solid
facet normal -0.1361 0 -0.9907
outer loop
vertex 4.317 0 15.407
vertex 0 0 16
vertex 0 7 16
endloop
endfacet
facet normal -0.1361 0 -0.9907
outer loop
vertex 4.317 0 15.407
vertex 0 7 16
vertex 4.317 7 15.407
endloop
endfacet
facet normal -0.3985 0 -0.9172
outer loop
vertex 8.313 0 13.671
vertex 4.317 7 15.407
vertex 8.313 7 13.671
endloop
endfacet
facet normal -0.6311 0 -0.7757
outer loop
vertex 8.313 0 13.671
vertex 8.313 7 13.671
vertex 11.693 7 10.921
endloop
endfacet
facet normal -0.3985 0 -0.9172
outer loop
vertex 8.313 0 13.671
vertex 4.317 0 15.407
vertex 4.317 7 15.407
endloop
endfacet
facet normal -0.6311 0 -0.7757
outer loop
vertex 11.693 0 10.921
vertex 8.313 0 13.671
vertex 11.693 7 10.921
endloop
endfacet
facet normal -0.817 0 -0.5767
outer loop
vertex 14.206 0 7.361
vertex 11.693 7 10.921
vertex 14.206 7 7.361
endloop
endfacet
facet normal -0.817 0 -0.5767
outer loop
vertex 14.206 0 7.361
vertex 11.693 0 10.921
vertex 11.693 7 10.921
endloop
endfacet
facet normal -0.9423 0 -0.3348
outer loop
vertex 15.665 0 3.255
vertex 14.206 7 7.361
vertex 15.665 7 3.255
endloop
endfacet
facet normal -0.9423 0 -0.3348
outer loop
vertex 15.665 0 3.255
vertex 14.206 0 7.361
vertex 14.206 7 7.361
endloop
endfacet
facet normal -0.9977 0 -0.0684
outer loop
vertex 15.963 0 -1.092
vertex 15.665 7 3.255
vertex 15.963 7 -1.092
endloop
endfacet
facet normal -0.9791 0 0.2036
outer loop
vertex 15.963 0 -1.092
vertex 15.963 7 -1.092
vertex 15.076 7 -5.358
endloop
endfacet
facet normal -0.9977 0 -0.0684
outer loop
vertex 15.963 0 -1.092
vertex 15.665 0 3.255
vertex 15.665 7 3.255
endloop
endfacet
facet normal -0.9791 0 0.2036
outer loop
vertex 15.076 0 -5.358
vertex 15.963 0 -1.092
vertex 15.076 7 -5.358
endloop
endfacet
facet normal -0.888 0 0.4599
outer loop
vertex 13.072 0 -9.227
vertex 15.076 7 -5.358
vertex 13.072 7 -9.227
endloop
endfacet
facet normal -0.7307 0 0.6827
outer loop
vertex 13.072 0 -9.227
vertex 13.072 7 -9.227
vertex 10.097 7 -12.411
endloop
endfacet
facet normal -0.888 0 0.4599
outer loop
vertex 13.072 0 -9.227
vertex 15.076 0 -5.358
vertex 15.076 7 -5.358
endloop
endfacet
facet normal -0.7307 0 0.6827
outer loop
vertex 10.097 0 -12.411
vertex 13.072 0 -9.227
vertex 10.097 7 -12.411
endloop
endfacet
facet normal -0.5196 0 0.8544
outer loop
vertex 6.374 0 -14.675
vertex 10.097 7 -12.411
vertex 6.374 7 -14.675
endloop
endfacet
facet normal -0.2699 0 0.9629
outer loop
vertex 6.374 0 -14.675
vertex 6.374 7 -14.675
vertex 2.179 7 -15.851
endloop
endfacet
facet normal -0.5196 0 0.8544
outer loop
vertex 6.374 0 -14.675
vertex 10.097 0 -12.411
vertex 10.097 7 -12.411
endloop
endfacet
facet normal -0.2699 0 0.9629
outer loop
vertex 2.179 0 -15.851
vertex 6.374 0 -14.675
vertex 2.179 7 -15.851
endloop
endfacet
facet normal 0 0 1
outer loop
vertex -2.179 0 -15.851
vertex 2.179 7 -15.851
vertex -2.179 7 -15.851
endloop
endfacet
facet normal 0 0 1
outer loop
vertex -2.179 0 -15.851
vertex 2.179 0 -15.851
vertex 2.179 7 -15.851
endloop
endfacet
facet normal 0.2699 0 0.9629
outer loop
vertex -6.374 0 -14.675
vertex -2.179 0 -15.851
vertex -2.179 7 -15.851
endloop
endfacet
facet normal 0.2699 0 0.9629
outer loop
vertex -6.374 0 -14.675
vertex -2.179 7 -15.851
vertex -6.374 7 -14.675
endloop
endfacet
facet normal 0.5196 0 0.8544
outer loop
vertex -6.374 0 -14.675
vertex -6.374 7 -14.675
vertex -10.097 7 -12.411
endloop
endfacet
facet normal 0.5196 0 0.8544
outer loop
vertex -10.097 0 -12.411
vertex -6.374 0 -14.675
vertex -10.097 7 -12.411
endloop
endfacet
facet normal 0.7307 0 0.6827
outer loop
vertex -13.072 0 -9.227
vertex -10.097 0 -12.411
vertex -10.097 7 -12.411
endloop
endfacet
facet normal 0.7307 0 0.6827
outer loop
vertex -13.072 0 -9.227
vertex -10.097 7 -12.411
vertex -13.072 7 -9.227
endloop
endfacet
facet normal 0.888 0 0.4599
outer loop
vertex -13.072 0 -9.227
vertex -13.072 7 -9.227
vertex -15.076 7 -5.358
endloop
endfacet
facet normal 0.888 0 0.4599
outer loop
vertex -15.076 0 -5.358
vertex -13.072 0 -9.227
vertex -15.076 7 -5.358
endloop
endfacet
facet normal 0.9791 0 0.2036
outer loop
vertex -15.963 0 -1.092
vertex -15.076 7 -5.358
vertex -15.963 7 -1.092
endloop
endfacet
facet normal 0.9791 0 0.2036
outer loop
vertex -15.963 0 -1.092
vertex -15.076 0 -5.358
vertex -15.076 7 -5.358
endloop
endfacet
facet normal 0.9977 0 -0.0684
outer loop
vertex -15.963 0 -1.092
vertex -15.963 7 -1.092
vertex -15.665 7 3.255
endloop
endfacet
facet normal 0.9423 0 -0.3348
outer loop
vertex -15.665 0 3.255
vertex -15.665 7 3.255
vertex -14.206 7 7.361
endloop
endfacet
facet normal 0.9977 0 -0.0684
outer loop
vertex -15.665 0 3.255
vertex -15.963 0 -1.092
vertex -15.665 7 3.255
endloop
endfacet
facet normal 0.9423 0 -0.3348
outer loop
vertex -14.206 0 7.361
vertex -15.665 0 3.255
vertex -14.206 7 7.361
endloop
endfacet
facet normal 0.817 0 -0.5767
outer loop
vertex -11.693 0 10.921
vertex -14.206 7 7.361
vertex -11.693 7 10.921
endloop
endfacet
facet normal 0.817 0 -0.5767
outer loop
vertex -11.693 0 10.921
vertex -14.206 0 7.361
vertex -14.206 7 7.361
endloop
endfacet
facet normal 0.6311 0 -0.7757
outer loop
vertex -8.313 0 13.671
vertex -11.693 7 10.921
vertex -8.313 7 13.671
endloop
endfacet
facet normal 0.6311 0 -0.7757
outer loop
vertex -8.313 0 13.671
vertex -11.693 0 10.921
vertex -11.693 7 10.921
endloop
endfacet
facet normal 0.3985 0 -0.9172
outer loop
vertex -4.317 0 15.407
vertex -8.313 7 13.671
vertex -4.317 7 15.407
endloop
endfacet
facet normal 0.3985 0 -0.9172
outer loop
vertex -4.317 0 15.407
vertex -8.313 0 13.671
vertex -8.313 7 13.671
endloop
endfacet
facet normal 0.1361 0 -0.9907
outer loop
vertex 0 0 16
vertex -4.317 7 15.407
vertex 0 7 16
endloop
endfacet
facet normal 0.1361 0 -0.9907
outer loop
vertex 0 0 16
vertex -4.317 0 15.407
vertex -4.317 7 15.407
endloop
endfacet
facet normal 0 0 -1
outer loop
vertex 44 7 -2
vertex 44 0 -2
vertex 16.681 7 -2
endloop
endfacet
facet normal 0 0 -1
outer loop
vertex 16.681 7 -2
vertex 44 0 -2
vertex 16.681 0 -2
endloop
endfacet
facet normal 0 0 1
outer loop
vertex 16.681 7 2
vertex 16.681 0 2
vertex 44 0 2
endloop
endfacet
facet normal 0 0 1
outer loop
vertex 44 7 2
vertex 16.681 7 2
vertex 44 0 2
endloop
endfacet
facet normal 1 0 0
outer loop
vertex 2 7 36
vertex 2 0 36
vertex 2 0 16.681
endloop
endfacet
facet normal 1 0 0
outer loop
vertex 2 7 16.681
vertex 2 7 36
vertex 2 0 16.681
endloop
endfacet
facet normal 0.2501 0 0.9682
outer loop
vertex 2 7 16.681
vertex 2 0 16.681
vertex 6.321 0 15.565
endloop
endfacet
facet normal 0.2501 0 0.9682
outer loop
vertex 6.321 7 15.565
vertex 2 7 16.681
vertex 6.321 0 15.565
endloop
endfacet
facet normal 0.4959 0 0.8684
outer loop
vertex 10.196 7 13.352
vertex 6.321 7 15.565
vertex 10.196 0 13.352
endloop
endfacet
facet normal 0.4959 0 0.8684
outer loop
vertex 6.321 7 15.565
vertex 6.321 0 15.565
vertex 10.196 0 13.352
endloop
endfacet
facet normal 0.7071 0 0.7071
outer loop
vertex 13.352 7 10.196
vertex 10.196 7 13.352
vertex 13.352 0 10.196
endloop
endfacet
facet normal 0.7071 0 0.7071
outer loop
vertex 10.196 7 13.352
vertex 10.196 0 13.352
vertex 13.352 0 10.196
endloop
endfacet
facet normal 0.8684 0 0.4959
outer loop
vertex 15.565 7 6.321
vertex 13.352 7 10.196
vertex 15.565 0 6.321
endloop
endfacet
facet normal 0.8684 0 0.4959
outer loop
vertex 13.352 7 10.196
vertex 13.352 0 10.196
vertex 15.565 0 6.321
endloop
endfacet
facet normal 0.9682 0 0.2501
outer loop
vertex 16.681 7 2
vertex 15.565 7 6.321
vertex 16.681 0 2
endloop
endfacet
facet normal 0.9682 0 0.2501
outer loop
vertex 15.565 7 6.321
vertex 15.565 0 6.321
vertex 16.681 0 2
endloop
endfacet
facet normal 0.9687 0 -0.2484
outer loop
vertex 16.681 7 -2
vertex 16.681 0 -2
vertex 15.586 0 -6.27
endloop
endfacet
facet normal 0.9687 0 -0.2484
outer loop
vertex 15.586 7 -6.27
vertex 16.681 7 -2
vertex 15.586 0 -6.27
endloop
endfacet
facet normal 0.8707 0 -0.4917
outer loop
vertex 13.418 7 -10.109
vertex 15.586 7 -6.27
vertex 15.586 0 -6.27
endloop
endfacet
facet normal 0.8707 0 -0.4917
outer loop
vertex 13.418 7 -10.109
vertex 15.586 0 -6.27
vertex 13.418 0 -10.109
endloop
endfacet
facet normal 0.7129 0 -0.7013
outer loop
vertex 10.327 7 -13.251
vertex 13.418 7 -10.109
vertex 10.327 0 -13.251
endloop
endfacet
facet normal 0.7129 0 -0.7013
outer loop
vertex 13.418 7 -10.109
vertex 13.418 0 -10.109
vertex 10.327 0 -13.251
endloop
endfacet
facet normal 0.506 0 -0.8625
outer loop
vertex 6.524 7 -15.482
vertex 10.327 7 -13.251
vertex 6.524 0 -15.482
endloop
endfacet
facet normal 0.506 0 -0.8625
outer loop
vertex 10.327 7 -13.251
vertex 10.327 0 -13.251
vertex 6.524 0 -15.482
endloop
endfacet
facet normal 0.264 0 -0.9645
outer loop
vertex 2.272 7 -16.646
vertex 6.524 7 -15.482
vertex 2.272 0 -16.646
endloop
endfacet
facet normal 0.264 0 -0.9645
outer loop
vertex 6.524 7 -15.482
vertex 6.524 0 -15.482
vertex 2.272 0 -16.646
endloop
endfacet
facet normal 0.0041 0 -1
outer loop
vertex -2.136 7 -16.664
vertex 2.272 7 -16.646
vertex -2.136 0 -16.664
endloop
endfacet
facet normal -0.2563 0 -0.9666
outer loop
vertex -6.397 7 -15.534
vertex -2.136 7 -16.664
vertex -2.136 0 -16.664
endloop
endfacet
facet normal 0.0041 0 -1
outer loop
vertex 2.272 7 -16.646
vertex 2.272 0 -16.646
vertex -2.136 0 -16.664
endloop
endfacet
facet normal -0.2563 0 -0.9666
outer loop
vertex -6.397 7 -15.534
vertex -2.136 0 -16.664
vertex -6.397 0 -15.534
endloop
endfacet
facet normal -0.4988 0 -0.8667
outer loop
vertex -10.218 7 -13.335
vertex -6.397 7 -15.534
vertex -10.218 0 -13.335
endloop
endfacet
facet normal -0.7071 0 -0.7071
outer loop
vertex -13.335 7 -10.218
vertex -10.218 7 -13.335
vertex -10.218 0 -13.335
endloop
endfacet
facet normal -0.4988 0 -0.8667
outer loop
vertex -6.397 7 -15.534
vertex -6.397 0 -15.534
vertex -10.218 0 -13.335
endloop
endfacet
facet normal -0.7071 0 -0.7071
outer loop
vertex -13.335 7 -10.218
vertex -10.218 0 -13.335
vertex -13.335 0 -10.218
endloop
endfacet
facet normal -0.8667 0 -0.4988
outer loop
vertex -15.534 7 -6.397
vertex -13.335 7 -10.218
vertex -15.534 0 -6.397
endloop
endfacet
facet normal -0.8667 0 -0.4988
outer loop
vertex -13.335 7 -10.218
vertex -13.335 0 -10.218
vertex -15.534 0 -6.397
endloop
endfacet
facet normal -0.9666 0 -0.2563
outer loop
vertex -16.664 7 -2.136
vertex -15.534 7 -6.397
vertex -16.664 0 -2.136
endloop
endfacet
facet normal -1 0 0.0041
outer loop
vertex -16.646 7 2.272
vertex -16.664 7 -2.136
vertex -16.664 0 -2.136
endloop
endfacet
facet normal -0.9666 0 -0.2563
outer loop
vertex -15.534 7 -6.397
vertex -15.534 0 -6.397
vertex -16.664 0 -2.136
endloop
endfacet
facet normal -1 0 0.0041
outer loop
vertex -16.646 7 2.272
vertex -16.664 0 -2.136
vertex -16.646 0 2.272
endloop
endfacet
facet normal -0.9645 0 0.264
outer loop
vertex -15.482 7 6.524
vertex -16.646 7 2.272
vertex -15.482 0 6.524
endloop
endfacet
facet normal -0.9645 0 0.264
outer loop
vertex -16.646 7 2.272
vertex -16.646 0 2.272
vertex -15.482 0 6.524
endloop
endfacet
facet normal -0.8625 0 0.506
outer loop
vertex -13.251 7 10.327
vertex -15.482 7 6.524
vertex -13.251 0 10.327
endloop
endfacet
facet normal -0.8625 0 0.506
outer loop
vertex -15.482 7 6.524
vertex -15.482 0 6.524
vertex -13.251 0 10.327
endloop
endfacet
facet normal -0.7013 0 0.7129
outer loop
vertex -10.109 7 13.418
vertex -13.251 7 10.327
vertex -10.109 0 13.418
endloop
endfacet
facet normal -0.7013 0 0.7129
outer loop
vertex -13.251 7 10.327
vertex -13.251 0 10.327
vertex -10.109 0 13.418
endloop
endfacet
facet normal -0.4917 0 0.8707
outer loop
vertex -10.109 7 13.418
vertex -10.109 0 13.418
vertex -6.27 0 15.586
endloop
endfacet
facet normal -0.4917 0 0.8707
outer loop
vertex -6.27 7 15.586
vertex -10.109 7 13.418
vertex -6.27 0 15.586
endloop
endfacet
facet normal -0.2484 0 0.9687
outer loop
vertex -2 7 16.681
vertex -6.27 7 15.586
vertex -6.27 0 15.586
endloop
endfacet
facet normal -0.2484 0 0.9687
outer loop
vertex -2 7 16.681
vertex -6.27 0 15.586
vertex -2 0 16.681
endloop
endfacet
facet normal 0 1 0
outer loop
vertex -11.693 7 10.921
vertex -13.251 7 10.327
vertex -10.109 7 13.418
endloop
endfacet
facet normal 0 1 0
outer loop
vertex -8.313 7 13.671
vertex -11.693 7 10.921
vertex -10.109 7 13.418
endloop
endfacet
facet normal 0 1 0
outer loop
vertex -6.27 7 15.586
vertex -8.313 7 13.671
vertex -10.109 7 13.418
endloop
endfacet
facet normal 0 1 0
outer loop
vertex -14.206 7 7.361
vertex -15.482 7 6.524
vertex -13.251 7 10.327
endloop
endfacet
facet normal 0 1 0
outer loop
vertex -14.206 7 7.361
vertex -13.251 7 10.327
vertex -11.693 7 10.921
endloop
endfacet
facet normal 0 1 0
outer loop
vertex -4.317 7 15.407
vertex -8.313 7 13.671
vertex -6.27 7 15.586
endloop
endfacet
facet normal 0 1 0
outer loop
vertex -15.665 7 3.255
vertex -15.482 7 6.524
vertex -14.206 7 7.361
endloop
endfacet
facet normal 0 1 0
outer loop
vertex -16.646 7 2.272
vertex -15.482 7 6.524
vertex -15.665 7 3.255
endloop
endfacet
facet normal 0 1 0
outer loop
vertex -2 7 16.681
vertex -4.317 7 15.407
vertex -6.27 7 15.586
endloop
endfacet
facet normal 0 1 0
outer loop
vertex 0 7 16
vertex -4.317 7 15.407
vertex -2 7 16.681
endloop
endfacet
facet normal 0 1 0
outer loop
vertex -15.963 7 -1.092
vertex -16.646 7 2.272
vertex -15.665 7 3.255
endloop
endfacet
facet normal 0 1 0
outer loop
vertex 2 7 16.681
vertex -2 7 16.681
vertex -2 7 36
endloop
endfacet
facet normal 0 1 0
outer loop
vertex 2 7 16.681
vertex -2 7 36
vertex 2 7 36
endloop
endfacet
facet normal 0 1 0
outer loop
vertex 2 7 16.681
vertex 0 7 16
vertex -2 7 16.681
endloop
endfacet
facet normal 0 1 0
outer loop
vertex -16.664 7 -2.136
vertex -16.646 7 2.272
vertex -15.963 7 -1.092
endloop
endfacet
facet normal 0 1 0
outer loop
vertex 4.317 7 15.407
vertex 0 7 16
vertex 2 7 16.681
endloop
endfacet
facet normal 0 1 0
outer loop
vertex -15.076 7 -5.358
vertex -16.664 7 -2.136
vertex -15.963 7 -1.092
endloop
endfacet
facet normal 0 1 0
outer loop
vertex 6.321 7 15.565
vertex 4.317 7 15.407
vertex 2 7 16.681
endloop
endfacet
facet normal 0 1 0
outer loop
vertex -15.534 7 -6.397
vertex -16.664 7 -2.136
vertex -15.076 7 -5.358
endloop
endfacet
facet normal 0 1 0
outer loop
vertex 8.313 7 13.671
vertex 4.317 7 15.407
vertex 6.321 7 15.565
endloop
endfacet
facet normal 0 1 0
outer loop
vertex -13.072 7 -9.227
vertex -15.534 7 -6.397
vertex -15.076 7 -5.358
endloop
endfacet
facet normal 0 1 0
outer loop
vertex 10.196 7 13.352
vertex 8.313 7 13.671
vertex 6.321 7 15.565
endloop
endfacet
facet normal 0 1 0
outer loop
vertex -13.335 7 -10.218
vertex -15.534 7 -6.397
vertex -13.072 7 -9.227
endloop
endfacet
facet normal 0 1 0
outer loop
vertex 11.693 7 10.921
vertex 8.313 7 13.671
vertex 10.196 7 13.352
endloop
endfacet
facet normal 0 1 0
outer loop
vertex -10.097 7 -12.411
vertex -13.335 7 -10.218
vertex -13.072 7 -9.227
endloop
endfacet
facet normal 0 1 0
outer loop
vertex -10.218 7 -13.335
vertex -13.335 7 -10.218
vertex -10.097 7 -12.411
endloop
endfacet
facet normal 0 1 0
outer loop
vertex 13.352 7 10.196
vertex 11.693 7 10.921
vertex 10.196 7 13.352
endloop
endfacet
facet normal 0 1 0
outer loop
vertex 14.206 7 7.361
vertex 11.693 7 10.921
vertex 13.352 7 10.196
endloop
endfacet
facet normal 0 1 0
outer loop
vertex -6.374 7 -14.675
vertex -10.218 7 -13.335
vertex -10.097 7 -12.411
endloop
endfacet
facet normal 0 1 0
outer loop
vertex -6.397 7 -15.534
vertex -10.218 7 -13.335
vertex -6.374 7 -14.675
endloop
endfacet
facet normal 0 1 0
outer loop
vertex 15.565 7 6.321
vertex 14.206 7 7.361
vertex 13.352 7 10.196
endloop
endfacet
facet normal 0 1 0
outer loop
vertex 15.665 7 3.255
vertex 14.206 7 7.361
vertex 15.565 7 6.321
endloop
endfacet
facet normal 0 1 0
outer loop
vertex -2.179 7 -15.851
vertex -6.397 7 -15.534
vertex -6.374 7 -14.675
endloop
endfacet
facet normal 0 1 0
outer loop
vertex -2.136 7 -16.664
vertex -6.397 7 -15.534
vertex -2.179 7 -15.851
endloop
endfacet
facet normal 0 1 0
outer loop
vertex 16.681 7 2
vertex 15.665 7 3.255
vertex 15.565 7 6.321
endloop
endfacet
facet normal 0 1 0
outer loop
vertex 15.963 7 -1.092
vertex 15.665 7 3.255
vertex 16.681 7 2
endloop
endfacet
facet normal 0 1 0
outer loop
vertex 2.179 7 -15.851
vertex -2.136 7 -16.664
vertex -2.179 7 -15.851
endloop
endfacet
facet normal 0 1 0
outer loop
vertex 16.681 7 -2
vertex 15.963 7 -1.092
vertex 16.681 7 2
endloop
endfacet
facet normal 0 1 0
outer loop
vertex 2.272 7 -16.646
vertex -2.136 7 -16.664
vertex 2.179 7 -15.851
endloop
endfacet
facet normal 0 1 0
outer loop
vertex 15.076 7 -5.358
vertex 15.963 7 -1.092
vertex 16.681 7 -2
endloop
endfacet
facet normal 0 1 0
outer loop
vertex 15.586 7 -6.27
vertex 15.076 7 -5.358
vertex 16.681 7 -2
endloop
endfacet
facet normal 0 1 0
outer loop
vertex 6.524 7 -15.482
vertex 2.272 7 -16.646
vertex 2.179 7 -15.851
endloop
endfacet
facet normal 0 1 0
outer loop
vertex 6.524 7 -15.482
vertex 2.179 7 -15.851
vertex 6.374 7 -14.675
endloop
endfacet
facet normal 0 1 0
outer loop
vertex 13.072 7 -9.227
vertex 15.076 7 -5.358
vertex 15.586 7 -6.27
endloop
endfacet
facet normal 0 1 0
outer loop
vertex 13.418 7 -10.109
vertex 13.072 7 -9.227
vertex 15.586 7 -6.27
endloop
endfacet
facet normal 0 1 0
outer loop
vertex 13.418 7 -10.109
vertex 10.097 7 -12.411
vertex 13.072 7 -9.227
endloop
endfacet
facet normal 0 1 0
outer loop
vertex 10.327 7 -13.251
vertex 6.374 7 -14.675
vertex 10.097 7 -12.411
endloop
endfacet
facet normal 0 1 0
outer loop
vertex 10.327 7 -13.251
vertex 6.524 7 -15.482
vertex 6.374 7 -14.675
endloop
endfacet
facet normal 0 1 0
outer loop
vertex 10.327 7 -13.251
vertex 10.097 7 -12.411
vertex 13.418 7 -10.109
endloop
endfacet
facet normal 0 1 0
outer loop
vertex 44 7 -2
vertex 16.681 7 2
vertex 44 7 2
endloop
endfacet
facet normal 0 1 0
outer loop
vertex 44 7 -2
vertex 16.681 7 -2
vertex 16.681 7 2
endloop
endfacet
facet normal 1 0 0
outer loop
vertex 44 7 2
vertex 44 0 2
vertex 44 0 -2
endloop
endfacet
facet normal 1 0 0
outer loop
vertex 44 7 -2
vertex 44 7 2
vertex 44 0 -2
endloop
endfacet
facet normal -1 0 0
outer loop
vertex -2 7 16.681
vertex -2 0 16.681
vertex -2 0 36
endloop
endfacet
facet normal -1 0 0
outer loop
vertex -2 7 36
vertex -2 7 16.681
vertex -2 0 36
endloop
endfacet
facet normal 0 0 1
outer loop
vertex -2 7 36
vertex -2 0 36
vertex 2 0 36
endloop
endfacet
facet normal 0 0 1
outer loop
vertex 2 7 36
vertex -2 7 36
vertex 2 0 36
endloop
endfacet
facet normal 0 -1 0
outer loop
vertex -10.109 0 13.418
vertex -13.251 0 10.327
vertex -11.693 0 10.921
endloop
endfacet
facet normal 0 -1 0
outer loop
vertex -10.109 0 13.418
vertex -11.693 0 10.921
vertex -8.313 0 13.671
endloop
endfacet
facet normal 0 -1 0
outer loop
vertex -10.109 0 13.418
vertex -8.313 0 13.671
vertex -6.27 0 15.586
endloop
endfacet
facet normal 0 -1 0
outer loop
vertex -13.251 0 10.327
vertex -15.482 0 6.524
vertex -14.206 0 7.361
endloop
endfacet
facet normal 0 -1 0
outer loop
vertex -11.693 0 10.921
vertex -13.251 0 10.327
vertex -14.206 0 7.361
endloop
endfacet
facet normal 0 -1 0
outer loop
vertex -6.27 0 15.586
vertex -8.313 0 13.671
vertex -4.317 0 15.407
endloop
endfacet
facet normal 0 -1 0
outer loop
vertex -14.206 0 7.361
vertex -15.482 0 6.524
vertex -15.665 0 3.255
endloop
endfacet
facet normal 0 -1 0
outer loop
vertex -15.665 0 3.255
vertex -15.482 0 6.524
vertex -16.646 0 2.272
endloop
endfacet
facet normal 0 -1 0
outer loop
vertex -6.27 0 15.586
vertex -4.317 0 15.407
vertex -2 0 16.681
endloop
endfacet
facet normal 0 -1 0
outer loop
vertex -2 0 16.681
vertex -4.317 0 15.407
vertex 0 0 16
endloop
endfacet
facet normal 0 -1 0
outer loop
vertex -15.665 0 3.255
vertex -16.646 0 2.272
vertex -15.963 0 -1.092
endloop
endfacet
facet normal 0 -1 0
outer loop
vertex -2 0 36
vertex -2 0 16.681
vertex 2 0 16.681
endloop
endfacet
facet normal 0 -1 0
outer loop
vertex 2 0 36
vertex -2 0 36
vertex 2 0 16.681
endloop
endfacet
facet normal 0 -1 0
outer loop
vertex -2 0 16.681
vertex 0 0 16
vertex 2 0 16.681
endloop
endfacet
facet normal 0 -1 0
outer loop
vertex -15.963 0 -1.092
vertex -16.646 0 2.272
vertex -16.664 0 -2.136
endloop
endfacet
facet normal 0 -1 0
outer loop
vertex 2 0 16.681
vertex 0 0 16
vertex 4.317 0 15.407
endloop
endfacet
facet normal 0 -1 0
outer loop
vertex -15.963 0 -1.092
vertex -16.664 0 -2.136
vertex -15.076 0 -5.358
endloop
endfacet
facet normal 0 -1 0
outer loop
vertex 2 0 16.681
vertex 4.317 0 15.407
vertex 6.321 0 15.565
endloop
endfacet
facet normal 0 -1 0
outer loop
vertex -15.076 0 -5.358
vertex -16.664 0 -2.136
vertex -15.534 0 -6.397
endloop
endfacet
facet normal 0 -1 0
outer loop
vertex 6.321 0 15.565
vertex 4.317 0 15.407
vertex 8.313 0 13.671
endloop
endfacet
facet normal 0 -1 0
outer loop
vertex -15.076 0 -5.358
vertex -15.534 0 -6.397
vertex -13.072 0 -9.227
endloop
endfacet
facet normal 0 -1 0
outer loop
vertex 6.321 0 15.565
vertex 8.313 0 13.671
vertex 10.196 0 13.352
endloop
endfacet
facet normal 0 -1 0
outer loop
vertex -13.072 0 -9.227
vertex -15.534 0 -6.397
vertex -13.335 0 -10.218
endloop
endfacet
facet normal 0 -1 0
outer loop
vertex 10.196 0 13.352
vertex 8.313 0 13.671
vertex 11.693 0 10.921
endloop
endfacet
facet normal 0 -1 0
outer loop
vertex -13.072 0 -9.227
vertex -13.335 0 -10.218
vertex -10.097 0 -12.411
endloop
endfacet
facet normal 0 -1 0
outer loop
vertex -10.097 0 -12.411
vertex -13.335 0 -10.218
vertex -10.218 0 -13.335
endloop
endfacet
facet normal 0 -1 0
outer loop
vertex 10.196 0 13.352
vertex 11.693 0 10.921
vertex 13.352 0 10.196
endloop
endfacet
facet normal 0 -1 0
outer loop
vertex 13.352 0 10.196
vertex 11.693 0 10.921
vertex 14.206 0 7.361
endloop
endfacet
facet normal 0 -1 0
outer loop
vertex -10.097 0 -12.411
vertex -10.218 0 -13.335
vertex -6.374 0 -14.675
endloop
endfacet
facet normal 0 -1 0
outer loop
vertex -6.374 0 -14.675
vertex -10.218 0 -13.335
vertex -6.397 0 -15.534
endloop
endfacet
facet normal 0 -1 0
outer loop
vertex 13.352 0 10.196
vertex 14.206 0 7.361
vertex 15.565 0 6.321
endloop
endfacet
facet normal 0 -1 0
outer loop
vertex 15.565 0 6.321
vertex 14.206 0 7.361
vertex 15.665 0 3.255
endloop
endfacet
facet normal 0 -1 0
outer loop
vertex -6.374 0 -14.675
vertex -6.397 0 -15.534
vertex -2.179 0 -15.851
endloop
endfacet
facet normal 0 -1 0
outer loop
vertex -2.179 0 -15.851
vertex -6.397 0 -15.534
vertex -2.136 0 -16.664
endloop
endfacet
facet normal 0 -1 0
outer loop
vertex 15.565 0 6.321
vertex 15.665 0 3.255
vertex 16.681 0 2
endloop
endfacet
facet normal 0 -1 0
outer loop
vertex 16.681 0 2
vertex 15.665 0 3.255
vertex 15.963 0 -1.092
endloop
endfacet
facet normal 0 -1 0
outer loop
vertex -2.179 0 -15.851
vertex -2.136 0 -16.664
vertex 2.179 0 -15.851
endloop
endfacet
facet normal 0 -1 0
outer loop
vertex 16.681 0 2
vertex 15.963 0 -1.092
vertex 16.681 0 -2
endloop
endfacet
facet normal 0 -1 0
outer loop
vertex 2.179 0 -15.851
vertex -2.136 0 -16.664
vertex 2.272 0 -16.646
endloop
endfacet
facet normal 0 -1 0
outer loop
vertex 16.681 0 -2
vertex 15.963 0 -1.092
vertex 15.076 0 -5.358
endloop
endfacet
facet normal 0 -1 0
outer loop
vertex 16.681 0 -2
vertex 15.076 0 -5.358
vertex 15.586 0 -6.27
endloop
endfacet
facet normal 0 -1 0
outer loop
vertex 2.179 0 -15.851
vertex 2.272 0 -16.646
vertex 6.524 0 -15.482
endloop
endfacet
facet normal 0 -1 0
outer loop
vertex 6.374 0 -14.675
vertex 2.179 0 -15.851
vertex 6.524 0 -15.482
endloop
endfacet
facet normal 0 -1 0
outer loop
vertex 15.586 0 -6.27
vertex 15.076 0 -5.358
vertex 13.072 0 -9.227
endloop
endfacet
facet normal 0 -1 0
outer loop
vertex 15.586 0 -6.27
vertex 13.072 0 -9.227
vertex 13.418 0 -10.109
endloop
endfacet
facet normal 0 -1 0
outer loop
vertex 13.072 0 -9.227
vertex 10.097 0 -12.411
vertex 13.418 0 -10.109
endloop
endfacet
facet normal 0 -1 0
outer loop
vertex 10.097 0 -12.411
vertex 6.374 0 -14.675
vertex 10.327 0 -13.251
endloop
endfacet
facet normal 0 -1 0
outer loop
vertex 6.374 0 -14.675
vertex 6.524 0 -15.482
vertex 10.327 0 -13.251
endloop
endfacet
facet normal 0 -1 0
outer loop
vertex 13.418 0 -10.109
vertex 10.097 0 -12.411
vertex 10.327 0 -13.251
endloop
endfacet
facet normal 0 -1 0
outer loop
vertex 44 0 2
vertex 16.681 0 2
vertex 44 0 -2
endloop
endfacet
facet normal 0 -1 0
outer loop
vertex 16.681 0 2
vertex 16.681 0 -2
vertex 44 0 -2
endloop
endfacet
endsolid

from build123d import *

# Parameters (mm, degrees)
SKETCH1_R           = 16
BOSS_EXTRUDE1_DEPTH = 7


with BuildPart() as part:
    # Sketch1 → Boss-Extrude1 (new body)
    with BuildSketch(Plane(origin=(0, 0, 0), x_dir=(1, 0, 0), z_dir=(0, 1, 0))):
        with BuildLine():
            Line((2, -36), (2, -16.68052757))
            ThreePointArc((2, -16.68052757), (11.879393924, -11.879393924), (16.68052757, -2))
            Line((16.68052757, -2), (44, -2))
            Line((44, -2), (44, 2))
            Line((44, 2), (16.68052757, 2))
            ThreePointArc((16.68052757, 2), (-11.879393924, 11.879393924), (-2, -16.68052757))
            Line((-2, -16.68052757), (-2, -36))
            Line((-2, -36), (2, -36))
        make_face()
        with Locations(Location((0, 0, 0), (0, 0, 270))):
            Circle(SKETCH1_R, mode=Mode.SUBTRACT)
    extrude(amount=BOSS_EXTRUDE1_DEPTH)


solid = part.part
